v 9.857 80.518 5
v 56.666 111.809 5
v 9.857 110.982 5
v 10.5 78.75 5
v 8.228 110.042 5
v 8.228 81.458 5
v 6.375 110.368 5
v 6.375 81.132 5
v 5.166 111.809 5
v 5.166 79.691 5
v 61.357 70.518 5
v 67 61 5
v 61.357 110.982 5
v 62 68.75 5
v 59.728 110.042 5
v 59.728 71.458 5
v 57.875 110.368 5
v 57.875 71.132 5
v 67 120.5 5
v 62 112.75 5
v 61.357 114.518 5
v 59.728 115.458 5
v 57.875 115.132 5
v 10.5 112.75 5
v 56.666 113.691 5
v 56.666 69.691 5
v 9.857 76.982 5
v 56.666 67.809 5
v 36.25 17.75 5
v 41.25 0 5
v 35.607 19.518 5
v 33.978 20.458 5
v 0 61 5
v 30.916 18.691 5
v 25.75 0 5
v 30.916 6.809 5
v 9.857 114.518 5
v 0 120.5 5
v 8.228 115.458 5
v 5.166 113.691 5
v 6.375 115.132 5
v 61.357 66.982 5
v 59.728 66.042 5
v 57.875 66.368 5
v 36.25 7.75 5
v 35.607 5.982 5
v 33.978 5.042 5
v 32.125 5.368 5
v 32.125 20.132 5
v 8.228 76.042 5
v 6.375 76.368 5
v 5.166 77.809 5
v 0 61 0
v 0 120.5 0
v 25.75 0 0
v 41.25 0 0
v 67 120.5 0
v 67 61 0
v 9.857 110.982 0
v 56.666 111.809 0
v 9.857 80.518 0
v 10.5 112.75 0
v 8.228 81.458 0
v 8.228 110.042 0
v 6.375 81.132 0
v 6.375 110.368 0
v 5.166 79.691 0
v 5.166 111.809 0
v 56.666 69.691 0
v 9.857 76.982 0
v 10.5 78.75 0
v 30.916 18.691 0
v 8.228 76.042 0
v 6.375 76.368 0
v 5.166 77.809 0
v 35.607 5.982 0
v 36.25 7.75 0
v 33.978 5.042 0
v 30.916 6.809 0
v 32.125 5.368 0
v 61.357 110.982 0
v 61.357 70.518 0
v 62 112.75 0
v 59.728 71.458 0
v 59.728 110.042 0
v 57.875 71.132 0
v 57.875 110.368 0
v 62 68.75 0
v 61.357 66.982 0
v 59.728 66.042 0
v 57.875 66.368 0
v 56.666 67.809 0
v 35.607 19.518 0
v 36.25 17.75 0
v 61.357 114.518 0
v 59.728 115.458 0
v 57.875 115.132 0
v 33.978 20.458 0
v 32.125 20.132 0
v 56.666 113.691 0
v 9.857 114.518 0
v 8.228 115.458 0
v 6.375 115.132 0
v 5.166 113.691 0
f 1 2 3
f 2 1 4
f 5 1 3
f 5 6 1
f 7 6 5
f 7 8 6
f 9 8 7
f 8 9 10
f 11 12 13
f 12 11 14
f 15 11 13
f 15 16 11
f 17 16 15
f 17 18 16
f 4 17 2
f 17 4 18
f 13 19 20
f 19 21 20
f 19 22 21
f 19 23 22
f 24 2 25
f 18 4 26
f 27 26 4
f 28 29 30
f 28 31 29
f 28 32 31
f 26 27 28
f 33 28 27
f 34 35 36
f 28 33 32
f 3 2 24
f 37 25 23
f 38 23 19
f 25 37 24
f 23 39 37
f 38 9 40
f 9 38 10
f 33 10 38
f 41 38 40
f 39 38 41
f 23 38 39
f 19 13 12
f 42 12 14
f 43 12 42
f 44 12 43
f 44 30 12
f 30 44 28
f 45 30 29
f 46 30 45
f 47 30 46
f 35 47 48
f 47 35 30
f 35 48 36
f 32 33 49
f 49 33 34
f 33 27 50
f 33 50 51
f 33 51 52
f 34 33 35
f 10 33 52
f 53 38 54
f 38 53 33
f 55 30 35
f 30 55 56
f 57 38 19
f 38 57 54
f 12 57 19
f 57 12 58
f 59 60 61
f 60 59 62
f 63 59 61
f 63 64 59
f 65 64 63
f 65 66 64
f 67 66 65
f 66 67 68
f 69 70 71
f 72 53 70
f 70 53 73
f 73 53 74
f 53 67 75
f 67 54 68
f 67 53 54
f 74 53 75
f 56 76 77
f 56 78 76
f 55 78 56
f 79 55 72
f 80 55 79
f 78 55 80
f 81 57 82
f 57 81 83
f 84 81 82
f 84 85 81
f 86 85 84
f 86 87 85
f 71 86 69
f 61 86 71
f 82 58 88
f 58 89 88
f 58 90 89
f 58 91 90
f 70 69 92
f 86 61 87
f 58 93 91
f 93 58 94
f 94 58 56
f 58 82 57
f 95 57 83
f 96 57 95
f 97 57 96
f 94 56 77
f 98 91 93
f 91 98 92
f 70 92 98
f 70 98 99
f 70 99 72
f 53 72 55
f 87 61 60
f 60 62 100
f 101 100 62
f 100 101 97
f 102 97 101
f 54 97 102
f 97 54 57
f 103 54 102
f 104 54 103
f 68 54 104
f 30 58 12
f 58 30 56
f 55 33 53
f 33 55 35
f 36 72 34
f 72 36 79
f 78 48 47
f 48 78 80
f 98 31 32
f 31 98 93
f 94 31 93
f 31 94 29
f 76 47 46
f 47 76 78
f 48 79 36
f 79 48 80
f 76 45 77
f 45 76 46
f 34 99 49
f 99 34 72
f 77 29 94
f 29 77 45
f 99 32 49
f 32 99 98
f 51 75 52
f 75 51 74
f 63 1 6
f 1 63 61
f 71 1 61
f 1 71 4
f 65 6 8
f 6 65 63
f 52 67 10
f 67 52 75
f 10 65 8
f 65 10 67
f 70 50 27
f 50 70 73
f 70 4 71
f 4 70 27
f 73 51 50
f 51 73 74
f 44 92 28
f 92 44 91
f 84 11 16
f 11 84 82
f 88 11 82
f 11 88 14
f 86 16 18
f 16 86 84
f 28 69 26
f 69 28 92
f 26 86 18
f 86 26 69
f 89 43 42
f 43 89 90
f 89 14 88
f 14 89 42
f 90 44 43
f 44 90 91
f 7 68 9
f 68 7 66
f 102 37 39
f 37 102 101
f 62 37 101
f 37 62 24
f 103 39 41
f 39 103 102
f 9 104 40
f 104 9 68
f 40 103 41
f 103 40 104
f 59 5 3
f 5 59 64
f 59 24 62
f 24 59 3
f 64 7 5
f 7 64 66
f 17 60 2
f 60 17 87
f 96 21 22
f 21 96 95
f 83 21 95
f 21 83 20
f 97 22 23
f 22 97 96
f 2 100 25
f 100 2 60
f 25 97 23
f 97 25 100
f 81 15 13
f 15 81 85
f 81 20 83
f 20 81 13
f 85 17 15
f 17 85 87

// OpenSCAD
// Uncomment before final render
//$fa = 0.01;
//$fs = 0.25;

module xAxisTopCarriage()
{
    difference()
    {
        hull()
        {
            translate([25.75, 0, 0])
            {
                cube([15.5, 25.5, 5]);
            }
            translate([0, 61, 0])
            {
                cube([15.5, 15.5, 5]);
            }
            translate([51.5, 61, 0])
            {
                cube([15.5, 15.5, 5]);
            }
            translate([0, 105, 0])
            {
                cube([15.5, 15.5, 5]);
            }
            translate([51.5, 105, 0])
            {
                cube([15.5, 15.5, 5]);
            }
        }
        hull()
        {
            translate([33.5, 7.75, -1])
            {
                cylinder(7, 2.75, 2.75);
            }
            translate([33.5, 17.75, -1])
            {
                cylinder(7, 2.75, 2.75);
            }
        }
        translate([7.75, 78.75, -1])
        {
            cylinder(7, 2.75, 2.75);
        }
        translate([59.25, 68.75, -1])
        {
            cylinder(7, 2.75, 2.75);
        }
        translate([7.75, 112.75, -1])
        {
            cylinder(7, 2.75, 2.75);
        }
        translate([59.25, 112.75, -1])
        {
            cylinder(7, 2.75, 2.75);
        }
    }
}

xAxisTopCarriage();
